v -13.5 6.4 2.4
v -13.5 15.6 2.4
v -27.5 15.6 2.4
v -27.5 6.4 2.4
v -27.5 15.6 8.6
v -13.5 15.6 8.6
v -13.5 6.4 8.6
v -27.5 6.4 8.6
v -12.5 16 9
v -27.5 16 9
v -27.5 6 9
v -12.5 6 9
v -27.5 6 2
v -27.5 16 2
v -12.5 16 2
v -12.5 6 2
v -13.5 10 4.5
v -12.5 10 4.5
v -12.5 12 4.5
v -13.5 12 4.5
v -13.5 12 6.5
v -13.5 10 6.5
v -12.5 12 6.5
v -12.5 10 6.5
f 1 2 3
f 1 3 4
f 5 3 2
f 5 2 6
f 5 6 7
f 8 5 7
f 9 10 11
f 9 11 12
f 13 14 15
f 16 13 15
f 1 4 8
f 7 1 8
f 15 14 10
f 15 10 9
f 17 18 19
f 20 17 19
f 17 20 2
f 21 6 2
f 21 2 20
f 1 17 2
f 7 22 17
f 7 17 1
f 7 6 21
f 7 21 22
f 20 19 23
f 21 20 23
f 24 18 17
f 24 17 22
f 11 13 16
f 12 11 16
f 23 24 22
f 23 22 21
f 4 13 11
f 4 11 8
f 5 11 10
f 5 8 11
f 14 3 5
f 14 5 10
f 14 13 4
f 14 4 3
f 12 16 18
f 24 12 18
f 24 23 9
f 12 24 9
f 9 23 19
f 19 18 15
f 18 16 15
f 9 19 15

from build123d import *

# Parameters (mm, degrees)
SKETCH133_W     = 15
SKETCH133_H     = 10
PAD068_DEPTH    = 7
SKETCH134_W     = 9.2
SKETCH134_H     = 6.2
POCKET056_DEPTH = 14
SKETCH135_W     = 2
SKETCH135_H     = 2
POCKET057_DEPTH = 5


with BuildPart() as part:
    # Sketch133 → Pad068 (new body)
    with BuildSketch(Plane.XY):
        Rectangle(SKETCH133_W, SKETCH133_H)
    extrude(amount=PAD068_DEPTH)

    # Sketch134 (on Face4 of Pad068) → Pocket056 (cut)
    with BuildSketch(Plane(origin=(-7.5, 0, 0), x_dir=(0, -1, 0), z_dir=(-1, 0, 0))):
        with Locations((0, 3.5)):
            Rectangle(SKETCH134_W, SKETCH134_H)
    extrude(amount=-POCKET056_DEPTH, mode=Mode.SUBTRACT)

    # Sketch135 (on Face3 of Pocket056) → Pocket057 (cut)
    with BuildSketch(Plane.YZ.offset(7.5)):
        with Locations((0, 3.5)):
            Rectangle(SKETCH135_W, SKETCH135_H)
    extrude(amount=-POCKET057_DEPTH, mode=Mode.SUBTRACT)


with BuildPart() as part_1:
    # Body009 placement: moved
    add(part.part.moved(Location((-20, 11, 2))))


solid = part_1.part
